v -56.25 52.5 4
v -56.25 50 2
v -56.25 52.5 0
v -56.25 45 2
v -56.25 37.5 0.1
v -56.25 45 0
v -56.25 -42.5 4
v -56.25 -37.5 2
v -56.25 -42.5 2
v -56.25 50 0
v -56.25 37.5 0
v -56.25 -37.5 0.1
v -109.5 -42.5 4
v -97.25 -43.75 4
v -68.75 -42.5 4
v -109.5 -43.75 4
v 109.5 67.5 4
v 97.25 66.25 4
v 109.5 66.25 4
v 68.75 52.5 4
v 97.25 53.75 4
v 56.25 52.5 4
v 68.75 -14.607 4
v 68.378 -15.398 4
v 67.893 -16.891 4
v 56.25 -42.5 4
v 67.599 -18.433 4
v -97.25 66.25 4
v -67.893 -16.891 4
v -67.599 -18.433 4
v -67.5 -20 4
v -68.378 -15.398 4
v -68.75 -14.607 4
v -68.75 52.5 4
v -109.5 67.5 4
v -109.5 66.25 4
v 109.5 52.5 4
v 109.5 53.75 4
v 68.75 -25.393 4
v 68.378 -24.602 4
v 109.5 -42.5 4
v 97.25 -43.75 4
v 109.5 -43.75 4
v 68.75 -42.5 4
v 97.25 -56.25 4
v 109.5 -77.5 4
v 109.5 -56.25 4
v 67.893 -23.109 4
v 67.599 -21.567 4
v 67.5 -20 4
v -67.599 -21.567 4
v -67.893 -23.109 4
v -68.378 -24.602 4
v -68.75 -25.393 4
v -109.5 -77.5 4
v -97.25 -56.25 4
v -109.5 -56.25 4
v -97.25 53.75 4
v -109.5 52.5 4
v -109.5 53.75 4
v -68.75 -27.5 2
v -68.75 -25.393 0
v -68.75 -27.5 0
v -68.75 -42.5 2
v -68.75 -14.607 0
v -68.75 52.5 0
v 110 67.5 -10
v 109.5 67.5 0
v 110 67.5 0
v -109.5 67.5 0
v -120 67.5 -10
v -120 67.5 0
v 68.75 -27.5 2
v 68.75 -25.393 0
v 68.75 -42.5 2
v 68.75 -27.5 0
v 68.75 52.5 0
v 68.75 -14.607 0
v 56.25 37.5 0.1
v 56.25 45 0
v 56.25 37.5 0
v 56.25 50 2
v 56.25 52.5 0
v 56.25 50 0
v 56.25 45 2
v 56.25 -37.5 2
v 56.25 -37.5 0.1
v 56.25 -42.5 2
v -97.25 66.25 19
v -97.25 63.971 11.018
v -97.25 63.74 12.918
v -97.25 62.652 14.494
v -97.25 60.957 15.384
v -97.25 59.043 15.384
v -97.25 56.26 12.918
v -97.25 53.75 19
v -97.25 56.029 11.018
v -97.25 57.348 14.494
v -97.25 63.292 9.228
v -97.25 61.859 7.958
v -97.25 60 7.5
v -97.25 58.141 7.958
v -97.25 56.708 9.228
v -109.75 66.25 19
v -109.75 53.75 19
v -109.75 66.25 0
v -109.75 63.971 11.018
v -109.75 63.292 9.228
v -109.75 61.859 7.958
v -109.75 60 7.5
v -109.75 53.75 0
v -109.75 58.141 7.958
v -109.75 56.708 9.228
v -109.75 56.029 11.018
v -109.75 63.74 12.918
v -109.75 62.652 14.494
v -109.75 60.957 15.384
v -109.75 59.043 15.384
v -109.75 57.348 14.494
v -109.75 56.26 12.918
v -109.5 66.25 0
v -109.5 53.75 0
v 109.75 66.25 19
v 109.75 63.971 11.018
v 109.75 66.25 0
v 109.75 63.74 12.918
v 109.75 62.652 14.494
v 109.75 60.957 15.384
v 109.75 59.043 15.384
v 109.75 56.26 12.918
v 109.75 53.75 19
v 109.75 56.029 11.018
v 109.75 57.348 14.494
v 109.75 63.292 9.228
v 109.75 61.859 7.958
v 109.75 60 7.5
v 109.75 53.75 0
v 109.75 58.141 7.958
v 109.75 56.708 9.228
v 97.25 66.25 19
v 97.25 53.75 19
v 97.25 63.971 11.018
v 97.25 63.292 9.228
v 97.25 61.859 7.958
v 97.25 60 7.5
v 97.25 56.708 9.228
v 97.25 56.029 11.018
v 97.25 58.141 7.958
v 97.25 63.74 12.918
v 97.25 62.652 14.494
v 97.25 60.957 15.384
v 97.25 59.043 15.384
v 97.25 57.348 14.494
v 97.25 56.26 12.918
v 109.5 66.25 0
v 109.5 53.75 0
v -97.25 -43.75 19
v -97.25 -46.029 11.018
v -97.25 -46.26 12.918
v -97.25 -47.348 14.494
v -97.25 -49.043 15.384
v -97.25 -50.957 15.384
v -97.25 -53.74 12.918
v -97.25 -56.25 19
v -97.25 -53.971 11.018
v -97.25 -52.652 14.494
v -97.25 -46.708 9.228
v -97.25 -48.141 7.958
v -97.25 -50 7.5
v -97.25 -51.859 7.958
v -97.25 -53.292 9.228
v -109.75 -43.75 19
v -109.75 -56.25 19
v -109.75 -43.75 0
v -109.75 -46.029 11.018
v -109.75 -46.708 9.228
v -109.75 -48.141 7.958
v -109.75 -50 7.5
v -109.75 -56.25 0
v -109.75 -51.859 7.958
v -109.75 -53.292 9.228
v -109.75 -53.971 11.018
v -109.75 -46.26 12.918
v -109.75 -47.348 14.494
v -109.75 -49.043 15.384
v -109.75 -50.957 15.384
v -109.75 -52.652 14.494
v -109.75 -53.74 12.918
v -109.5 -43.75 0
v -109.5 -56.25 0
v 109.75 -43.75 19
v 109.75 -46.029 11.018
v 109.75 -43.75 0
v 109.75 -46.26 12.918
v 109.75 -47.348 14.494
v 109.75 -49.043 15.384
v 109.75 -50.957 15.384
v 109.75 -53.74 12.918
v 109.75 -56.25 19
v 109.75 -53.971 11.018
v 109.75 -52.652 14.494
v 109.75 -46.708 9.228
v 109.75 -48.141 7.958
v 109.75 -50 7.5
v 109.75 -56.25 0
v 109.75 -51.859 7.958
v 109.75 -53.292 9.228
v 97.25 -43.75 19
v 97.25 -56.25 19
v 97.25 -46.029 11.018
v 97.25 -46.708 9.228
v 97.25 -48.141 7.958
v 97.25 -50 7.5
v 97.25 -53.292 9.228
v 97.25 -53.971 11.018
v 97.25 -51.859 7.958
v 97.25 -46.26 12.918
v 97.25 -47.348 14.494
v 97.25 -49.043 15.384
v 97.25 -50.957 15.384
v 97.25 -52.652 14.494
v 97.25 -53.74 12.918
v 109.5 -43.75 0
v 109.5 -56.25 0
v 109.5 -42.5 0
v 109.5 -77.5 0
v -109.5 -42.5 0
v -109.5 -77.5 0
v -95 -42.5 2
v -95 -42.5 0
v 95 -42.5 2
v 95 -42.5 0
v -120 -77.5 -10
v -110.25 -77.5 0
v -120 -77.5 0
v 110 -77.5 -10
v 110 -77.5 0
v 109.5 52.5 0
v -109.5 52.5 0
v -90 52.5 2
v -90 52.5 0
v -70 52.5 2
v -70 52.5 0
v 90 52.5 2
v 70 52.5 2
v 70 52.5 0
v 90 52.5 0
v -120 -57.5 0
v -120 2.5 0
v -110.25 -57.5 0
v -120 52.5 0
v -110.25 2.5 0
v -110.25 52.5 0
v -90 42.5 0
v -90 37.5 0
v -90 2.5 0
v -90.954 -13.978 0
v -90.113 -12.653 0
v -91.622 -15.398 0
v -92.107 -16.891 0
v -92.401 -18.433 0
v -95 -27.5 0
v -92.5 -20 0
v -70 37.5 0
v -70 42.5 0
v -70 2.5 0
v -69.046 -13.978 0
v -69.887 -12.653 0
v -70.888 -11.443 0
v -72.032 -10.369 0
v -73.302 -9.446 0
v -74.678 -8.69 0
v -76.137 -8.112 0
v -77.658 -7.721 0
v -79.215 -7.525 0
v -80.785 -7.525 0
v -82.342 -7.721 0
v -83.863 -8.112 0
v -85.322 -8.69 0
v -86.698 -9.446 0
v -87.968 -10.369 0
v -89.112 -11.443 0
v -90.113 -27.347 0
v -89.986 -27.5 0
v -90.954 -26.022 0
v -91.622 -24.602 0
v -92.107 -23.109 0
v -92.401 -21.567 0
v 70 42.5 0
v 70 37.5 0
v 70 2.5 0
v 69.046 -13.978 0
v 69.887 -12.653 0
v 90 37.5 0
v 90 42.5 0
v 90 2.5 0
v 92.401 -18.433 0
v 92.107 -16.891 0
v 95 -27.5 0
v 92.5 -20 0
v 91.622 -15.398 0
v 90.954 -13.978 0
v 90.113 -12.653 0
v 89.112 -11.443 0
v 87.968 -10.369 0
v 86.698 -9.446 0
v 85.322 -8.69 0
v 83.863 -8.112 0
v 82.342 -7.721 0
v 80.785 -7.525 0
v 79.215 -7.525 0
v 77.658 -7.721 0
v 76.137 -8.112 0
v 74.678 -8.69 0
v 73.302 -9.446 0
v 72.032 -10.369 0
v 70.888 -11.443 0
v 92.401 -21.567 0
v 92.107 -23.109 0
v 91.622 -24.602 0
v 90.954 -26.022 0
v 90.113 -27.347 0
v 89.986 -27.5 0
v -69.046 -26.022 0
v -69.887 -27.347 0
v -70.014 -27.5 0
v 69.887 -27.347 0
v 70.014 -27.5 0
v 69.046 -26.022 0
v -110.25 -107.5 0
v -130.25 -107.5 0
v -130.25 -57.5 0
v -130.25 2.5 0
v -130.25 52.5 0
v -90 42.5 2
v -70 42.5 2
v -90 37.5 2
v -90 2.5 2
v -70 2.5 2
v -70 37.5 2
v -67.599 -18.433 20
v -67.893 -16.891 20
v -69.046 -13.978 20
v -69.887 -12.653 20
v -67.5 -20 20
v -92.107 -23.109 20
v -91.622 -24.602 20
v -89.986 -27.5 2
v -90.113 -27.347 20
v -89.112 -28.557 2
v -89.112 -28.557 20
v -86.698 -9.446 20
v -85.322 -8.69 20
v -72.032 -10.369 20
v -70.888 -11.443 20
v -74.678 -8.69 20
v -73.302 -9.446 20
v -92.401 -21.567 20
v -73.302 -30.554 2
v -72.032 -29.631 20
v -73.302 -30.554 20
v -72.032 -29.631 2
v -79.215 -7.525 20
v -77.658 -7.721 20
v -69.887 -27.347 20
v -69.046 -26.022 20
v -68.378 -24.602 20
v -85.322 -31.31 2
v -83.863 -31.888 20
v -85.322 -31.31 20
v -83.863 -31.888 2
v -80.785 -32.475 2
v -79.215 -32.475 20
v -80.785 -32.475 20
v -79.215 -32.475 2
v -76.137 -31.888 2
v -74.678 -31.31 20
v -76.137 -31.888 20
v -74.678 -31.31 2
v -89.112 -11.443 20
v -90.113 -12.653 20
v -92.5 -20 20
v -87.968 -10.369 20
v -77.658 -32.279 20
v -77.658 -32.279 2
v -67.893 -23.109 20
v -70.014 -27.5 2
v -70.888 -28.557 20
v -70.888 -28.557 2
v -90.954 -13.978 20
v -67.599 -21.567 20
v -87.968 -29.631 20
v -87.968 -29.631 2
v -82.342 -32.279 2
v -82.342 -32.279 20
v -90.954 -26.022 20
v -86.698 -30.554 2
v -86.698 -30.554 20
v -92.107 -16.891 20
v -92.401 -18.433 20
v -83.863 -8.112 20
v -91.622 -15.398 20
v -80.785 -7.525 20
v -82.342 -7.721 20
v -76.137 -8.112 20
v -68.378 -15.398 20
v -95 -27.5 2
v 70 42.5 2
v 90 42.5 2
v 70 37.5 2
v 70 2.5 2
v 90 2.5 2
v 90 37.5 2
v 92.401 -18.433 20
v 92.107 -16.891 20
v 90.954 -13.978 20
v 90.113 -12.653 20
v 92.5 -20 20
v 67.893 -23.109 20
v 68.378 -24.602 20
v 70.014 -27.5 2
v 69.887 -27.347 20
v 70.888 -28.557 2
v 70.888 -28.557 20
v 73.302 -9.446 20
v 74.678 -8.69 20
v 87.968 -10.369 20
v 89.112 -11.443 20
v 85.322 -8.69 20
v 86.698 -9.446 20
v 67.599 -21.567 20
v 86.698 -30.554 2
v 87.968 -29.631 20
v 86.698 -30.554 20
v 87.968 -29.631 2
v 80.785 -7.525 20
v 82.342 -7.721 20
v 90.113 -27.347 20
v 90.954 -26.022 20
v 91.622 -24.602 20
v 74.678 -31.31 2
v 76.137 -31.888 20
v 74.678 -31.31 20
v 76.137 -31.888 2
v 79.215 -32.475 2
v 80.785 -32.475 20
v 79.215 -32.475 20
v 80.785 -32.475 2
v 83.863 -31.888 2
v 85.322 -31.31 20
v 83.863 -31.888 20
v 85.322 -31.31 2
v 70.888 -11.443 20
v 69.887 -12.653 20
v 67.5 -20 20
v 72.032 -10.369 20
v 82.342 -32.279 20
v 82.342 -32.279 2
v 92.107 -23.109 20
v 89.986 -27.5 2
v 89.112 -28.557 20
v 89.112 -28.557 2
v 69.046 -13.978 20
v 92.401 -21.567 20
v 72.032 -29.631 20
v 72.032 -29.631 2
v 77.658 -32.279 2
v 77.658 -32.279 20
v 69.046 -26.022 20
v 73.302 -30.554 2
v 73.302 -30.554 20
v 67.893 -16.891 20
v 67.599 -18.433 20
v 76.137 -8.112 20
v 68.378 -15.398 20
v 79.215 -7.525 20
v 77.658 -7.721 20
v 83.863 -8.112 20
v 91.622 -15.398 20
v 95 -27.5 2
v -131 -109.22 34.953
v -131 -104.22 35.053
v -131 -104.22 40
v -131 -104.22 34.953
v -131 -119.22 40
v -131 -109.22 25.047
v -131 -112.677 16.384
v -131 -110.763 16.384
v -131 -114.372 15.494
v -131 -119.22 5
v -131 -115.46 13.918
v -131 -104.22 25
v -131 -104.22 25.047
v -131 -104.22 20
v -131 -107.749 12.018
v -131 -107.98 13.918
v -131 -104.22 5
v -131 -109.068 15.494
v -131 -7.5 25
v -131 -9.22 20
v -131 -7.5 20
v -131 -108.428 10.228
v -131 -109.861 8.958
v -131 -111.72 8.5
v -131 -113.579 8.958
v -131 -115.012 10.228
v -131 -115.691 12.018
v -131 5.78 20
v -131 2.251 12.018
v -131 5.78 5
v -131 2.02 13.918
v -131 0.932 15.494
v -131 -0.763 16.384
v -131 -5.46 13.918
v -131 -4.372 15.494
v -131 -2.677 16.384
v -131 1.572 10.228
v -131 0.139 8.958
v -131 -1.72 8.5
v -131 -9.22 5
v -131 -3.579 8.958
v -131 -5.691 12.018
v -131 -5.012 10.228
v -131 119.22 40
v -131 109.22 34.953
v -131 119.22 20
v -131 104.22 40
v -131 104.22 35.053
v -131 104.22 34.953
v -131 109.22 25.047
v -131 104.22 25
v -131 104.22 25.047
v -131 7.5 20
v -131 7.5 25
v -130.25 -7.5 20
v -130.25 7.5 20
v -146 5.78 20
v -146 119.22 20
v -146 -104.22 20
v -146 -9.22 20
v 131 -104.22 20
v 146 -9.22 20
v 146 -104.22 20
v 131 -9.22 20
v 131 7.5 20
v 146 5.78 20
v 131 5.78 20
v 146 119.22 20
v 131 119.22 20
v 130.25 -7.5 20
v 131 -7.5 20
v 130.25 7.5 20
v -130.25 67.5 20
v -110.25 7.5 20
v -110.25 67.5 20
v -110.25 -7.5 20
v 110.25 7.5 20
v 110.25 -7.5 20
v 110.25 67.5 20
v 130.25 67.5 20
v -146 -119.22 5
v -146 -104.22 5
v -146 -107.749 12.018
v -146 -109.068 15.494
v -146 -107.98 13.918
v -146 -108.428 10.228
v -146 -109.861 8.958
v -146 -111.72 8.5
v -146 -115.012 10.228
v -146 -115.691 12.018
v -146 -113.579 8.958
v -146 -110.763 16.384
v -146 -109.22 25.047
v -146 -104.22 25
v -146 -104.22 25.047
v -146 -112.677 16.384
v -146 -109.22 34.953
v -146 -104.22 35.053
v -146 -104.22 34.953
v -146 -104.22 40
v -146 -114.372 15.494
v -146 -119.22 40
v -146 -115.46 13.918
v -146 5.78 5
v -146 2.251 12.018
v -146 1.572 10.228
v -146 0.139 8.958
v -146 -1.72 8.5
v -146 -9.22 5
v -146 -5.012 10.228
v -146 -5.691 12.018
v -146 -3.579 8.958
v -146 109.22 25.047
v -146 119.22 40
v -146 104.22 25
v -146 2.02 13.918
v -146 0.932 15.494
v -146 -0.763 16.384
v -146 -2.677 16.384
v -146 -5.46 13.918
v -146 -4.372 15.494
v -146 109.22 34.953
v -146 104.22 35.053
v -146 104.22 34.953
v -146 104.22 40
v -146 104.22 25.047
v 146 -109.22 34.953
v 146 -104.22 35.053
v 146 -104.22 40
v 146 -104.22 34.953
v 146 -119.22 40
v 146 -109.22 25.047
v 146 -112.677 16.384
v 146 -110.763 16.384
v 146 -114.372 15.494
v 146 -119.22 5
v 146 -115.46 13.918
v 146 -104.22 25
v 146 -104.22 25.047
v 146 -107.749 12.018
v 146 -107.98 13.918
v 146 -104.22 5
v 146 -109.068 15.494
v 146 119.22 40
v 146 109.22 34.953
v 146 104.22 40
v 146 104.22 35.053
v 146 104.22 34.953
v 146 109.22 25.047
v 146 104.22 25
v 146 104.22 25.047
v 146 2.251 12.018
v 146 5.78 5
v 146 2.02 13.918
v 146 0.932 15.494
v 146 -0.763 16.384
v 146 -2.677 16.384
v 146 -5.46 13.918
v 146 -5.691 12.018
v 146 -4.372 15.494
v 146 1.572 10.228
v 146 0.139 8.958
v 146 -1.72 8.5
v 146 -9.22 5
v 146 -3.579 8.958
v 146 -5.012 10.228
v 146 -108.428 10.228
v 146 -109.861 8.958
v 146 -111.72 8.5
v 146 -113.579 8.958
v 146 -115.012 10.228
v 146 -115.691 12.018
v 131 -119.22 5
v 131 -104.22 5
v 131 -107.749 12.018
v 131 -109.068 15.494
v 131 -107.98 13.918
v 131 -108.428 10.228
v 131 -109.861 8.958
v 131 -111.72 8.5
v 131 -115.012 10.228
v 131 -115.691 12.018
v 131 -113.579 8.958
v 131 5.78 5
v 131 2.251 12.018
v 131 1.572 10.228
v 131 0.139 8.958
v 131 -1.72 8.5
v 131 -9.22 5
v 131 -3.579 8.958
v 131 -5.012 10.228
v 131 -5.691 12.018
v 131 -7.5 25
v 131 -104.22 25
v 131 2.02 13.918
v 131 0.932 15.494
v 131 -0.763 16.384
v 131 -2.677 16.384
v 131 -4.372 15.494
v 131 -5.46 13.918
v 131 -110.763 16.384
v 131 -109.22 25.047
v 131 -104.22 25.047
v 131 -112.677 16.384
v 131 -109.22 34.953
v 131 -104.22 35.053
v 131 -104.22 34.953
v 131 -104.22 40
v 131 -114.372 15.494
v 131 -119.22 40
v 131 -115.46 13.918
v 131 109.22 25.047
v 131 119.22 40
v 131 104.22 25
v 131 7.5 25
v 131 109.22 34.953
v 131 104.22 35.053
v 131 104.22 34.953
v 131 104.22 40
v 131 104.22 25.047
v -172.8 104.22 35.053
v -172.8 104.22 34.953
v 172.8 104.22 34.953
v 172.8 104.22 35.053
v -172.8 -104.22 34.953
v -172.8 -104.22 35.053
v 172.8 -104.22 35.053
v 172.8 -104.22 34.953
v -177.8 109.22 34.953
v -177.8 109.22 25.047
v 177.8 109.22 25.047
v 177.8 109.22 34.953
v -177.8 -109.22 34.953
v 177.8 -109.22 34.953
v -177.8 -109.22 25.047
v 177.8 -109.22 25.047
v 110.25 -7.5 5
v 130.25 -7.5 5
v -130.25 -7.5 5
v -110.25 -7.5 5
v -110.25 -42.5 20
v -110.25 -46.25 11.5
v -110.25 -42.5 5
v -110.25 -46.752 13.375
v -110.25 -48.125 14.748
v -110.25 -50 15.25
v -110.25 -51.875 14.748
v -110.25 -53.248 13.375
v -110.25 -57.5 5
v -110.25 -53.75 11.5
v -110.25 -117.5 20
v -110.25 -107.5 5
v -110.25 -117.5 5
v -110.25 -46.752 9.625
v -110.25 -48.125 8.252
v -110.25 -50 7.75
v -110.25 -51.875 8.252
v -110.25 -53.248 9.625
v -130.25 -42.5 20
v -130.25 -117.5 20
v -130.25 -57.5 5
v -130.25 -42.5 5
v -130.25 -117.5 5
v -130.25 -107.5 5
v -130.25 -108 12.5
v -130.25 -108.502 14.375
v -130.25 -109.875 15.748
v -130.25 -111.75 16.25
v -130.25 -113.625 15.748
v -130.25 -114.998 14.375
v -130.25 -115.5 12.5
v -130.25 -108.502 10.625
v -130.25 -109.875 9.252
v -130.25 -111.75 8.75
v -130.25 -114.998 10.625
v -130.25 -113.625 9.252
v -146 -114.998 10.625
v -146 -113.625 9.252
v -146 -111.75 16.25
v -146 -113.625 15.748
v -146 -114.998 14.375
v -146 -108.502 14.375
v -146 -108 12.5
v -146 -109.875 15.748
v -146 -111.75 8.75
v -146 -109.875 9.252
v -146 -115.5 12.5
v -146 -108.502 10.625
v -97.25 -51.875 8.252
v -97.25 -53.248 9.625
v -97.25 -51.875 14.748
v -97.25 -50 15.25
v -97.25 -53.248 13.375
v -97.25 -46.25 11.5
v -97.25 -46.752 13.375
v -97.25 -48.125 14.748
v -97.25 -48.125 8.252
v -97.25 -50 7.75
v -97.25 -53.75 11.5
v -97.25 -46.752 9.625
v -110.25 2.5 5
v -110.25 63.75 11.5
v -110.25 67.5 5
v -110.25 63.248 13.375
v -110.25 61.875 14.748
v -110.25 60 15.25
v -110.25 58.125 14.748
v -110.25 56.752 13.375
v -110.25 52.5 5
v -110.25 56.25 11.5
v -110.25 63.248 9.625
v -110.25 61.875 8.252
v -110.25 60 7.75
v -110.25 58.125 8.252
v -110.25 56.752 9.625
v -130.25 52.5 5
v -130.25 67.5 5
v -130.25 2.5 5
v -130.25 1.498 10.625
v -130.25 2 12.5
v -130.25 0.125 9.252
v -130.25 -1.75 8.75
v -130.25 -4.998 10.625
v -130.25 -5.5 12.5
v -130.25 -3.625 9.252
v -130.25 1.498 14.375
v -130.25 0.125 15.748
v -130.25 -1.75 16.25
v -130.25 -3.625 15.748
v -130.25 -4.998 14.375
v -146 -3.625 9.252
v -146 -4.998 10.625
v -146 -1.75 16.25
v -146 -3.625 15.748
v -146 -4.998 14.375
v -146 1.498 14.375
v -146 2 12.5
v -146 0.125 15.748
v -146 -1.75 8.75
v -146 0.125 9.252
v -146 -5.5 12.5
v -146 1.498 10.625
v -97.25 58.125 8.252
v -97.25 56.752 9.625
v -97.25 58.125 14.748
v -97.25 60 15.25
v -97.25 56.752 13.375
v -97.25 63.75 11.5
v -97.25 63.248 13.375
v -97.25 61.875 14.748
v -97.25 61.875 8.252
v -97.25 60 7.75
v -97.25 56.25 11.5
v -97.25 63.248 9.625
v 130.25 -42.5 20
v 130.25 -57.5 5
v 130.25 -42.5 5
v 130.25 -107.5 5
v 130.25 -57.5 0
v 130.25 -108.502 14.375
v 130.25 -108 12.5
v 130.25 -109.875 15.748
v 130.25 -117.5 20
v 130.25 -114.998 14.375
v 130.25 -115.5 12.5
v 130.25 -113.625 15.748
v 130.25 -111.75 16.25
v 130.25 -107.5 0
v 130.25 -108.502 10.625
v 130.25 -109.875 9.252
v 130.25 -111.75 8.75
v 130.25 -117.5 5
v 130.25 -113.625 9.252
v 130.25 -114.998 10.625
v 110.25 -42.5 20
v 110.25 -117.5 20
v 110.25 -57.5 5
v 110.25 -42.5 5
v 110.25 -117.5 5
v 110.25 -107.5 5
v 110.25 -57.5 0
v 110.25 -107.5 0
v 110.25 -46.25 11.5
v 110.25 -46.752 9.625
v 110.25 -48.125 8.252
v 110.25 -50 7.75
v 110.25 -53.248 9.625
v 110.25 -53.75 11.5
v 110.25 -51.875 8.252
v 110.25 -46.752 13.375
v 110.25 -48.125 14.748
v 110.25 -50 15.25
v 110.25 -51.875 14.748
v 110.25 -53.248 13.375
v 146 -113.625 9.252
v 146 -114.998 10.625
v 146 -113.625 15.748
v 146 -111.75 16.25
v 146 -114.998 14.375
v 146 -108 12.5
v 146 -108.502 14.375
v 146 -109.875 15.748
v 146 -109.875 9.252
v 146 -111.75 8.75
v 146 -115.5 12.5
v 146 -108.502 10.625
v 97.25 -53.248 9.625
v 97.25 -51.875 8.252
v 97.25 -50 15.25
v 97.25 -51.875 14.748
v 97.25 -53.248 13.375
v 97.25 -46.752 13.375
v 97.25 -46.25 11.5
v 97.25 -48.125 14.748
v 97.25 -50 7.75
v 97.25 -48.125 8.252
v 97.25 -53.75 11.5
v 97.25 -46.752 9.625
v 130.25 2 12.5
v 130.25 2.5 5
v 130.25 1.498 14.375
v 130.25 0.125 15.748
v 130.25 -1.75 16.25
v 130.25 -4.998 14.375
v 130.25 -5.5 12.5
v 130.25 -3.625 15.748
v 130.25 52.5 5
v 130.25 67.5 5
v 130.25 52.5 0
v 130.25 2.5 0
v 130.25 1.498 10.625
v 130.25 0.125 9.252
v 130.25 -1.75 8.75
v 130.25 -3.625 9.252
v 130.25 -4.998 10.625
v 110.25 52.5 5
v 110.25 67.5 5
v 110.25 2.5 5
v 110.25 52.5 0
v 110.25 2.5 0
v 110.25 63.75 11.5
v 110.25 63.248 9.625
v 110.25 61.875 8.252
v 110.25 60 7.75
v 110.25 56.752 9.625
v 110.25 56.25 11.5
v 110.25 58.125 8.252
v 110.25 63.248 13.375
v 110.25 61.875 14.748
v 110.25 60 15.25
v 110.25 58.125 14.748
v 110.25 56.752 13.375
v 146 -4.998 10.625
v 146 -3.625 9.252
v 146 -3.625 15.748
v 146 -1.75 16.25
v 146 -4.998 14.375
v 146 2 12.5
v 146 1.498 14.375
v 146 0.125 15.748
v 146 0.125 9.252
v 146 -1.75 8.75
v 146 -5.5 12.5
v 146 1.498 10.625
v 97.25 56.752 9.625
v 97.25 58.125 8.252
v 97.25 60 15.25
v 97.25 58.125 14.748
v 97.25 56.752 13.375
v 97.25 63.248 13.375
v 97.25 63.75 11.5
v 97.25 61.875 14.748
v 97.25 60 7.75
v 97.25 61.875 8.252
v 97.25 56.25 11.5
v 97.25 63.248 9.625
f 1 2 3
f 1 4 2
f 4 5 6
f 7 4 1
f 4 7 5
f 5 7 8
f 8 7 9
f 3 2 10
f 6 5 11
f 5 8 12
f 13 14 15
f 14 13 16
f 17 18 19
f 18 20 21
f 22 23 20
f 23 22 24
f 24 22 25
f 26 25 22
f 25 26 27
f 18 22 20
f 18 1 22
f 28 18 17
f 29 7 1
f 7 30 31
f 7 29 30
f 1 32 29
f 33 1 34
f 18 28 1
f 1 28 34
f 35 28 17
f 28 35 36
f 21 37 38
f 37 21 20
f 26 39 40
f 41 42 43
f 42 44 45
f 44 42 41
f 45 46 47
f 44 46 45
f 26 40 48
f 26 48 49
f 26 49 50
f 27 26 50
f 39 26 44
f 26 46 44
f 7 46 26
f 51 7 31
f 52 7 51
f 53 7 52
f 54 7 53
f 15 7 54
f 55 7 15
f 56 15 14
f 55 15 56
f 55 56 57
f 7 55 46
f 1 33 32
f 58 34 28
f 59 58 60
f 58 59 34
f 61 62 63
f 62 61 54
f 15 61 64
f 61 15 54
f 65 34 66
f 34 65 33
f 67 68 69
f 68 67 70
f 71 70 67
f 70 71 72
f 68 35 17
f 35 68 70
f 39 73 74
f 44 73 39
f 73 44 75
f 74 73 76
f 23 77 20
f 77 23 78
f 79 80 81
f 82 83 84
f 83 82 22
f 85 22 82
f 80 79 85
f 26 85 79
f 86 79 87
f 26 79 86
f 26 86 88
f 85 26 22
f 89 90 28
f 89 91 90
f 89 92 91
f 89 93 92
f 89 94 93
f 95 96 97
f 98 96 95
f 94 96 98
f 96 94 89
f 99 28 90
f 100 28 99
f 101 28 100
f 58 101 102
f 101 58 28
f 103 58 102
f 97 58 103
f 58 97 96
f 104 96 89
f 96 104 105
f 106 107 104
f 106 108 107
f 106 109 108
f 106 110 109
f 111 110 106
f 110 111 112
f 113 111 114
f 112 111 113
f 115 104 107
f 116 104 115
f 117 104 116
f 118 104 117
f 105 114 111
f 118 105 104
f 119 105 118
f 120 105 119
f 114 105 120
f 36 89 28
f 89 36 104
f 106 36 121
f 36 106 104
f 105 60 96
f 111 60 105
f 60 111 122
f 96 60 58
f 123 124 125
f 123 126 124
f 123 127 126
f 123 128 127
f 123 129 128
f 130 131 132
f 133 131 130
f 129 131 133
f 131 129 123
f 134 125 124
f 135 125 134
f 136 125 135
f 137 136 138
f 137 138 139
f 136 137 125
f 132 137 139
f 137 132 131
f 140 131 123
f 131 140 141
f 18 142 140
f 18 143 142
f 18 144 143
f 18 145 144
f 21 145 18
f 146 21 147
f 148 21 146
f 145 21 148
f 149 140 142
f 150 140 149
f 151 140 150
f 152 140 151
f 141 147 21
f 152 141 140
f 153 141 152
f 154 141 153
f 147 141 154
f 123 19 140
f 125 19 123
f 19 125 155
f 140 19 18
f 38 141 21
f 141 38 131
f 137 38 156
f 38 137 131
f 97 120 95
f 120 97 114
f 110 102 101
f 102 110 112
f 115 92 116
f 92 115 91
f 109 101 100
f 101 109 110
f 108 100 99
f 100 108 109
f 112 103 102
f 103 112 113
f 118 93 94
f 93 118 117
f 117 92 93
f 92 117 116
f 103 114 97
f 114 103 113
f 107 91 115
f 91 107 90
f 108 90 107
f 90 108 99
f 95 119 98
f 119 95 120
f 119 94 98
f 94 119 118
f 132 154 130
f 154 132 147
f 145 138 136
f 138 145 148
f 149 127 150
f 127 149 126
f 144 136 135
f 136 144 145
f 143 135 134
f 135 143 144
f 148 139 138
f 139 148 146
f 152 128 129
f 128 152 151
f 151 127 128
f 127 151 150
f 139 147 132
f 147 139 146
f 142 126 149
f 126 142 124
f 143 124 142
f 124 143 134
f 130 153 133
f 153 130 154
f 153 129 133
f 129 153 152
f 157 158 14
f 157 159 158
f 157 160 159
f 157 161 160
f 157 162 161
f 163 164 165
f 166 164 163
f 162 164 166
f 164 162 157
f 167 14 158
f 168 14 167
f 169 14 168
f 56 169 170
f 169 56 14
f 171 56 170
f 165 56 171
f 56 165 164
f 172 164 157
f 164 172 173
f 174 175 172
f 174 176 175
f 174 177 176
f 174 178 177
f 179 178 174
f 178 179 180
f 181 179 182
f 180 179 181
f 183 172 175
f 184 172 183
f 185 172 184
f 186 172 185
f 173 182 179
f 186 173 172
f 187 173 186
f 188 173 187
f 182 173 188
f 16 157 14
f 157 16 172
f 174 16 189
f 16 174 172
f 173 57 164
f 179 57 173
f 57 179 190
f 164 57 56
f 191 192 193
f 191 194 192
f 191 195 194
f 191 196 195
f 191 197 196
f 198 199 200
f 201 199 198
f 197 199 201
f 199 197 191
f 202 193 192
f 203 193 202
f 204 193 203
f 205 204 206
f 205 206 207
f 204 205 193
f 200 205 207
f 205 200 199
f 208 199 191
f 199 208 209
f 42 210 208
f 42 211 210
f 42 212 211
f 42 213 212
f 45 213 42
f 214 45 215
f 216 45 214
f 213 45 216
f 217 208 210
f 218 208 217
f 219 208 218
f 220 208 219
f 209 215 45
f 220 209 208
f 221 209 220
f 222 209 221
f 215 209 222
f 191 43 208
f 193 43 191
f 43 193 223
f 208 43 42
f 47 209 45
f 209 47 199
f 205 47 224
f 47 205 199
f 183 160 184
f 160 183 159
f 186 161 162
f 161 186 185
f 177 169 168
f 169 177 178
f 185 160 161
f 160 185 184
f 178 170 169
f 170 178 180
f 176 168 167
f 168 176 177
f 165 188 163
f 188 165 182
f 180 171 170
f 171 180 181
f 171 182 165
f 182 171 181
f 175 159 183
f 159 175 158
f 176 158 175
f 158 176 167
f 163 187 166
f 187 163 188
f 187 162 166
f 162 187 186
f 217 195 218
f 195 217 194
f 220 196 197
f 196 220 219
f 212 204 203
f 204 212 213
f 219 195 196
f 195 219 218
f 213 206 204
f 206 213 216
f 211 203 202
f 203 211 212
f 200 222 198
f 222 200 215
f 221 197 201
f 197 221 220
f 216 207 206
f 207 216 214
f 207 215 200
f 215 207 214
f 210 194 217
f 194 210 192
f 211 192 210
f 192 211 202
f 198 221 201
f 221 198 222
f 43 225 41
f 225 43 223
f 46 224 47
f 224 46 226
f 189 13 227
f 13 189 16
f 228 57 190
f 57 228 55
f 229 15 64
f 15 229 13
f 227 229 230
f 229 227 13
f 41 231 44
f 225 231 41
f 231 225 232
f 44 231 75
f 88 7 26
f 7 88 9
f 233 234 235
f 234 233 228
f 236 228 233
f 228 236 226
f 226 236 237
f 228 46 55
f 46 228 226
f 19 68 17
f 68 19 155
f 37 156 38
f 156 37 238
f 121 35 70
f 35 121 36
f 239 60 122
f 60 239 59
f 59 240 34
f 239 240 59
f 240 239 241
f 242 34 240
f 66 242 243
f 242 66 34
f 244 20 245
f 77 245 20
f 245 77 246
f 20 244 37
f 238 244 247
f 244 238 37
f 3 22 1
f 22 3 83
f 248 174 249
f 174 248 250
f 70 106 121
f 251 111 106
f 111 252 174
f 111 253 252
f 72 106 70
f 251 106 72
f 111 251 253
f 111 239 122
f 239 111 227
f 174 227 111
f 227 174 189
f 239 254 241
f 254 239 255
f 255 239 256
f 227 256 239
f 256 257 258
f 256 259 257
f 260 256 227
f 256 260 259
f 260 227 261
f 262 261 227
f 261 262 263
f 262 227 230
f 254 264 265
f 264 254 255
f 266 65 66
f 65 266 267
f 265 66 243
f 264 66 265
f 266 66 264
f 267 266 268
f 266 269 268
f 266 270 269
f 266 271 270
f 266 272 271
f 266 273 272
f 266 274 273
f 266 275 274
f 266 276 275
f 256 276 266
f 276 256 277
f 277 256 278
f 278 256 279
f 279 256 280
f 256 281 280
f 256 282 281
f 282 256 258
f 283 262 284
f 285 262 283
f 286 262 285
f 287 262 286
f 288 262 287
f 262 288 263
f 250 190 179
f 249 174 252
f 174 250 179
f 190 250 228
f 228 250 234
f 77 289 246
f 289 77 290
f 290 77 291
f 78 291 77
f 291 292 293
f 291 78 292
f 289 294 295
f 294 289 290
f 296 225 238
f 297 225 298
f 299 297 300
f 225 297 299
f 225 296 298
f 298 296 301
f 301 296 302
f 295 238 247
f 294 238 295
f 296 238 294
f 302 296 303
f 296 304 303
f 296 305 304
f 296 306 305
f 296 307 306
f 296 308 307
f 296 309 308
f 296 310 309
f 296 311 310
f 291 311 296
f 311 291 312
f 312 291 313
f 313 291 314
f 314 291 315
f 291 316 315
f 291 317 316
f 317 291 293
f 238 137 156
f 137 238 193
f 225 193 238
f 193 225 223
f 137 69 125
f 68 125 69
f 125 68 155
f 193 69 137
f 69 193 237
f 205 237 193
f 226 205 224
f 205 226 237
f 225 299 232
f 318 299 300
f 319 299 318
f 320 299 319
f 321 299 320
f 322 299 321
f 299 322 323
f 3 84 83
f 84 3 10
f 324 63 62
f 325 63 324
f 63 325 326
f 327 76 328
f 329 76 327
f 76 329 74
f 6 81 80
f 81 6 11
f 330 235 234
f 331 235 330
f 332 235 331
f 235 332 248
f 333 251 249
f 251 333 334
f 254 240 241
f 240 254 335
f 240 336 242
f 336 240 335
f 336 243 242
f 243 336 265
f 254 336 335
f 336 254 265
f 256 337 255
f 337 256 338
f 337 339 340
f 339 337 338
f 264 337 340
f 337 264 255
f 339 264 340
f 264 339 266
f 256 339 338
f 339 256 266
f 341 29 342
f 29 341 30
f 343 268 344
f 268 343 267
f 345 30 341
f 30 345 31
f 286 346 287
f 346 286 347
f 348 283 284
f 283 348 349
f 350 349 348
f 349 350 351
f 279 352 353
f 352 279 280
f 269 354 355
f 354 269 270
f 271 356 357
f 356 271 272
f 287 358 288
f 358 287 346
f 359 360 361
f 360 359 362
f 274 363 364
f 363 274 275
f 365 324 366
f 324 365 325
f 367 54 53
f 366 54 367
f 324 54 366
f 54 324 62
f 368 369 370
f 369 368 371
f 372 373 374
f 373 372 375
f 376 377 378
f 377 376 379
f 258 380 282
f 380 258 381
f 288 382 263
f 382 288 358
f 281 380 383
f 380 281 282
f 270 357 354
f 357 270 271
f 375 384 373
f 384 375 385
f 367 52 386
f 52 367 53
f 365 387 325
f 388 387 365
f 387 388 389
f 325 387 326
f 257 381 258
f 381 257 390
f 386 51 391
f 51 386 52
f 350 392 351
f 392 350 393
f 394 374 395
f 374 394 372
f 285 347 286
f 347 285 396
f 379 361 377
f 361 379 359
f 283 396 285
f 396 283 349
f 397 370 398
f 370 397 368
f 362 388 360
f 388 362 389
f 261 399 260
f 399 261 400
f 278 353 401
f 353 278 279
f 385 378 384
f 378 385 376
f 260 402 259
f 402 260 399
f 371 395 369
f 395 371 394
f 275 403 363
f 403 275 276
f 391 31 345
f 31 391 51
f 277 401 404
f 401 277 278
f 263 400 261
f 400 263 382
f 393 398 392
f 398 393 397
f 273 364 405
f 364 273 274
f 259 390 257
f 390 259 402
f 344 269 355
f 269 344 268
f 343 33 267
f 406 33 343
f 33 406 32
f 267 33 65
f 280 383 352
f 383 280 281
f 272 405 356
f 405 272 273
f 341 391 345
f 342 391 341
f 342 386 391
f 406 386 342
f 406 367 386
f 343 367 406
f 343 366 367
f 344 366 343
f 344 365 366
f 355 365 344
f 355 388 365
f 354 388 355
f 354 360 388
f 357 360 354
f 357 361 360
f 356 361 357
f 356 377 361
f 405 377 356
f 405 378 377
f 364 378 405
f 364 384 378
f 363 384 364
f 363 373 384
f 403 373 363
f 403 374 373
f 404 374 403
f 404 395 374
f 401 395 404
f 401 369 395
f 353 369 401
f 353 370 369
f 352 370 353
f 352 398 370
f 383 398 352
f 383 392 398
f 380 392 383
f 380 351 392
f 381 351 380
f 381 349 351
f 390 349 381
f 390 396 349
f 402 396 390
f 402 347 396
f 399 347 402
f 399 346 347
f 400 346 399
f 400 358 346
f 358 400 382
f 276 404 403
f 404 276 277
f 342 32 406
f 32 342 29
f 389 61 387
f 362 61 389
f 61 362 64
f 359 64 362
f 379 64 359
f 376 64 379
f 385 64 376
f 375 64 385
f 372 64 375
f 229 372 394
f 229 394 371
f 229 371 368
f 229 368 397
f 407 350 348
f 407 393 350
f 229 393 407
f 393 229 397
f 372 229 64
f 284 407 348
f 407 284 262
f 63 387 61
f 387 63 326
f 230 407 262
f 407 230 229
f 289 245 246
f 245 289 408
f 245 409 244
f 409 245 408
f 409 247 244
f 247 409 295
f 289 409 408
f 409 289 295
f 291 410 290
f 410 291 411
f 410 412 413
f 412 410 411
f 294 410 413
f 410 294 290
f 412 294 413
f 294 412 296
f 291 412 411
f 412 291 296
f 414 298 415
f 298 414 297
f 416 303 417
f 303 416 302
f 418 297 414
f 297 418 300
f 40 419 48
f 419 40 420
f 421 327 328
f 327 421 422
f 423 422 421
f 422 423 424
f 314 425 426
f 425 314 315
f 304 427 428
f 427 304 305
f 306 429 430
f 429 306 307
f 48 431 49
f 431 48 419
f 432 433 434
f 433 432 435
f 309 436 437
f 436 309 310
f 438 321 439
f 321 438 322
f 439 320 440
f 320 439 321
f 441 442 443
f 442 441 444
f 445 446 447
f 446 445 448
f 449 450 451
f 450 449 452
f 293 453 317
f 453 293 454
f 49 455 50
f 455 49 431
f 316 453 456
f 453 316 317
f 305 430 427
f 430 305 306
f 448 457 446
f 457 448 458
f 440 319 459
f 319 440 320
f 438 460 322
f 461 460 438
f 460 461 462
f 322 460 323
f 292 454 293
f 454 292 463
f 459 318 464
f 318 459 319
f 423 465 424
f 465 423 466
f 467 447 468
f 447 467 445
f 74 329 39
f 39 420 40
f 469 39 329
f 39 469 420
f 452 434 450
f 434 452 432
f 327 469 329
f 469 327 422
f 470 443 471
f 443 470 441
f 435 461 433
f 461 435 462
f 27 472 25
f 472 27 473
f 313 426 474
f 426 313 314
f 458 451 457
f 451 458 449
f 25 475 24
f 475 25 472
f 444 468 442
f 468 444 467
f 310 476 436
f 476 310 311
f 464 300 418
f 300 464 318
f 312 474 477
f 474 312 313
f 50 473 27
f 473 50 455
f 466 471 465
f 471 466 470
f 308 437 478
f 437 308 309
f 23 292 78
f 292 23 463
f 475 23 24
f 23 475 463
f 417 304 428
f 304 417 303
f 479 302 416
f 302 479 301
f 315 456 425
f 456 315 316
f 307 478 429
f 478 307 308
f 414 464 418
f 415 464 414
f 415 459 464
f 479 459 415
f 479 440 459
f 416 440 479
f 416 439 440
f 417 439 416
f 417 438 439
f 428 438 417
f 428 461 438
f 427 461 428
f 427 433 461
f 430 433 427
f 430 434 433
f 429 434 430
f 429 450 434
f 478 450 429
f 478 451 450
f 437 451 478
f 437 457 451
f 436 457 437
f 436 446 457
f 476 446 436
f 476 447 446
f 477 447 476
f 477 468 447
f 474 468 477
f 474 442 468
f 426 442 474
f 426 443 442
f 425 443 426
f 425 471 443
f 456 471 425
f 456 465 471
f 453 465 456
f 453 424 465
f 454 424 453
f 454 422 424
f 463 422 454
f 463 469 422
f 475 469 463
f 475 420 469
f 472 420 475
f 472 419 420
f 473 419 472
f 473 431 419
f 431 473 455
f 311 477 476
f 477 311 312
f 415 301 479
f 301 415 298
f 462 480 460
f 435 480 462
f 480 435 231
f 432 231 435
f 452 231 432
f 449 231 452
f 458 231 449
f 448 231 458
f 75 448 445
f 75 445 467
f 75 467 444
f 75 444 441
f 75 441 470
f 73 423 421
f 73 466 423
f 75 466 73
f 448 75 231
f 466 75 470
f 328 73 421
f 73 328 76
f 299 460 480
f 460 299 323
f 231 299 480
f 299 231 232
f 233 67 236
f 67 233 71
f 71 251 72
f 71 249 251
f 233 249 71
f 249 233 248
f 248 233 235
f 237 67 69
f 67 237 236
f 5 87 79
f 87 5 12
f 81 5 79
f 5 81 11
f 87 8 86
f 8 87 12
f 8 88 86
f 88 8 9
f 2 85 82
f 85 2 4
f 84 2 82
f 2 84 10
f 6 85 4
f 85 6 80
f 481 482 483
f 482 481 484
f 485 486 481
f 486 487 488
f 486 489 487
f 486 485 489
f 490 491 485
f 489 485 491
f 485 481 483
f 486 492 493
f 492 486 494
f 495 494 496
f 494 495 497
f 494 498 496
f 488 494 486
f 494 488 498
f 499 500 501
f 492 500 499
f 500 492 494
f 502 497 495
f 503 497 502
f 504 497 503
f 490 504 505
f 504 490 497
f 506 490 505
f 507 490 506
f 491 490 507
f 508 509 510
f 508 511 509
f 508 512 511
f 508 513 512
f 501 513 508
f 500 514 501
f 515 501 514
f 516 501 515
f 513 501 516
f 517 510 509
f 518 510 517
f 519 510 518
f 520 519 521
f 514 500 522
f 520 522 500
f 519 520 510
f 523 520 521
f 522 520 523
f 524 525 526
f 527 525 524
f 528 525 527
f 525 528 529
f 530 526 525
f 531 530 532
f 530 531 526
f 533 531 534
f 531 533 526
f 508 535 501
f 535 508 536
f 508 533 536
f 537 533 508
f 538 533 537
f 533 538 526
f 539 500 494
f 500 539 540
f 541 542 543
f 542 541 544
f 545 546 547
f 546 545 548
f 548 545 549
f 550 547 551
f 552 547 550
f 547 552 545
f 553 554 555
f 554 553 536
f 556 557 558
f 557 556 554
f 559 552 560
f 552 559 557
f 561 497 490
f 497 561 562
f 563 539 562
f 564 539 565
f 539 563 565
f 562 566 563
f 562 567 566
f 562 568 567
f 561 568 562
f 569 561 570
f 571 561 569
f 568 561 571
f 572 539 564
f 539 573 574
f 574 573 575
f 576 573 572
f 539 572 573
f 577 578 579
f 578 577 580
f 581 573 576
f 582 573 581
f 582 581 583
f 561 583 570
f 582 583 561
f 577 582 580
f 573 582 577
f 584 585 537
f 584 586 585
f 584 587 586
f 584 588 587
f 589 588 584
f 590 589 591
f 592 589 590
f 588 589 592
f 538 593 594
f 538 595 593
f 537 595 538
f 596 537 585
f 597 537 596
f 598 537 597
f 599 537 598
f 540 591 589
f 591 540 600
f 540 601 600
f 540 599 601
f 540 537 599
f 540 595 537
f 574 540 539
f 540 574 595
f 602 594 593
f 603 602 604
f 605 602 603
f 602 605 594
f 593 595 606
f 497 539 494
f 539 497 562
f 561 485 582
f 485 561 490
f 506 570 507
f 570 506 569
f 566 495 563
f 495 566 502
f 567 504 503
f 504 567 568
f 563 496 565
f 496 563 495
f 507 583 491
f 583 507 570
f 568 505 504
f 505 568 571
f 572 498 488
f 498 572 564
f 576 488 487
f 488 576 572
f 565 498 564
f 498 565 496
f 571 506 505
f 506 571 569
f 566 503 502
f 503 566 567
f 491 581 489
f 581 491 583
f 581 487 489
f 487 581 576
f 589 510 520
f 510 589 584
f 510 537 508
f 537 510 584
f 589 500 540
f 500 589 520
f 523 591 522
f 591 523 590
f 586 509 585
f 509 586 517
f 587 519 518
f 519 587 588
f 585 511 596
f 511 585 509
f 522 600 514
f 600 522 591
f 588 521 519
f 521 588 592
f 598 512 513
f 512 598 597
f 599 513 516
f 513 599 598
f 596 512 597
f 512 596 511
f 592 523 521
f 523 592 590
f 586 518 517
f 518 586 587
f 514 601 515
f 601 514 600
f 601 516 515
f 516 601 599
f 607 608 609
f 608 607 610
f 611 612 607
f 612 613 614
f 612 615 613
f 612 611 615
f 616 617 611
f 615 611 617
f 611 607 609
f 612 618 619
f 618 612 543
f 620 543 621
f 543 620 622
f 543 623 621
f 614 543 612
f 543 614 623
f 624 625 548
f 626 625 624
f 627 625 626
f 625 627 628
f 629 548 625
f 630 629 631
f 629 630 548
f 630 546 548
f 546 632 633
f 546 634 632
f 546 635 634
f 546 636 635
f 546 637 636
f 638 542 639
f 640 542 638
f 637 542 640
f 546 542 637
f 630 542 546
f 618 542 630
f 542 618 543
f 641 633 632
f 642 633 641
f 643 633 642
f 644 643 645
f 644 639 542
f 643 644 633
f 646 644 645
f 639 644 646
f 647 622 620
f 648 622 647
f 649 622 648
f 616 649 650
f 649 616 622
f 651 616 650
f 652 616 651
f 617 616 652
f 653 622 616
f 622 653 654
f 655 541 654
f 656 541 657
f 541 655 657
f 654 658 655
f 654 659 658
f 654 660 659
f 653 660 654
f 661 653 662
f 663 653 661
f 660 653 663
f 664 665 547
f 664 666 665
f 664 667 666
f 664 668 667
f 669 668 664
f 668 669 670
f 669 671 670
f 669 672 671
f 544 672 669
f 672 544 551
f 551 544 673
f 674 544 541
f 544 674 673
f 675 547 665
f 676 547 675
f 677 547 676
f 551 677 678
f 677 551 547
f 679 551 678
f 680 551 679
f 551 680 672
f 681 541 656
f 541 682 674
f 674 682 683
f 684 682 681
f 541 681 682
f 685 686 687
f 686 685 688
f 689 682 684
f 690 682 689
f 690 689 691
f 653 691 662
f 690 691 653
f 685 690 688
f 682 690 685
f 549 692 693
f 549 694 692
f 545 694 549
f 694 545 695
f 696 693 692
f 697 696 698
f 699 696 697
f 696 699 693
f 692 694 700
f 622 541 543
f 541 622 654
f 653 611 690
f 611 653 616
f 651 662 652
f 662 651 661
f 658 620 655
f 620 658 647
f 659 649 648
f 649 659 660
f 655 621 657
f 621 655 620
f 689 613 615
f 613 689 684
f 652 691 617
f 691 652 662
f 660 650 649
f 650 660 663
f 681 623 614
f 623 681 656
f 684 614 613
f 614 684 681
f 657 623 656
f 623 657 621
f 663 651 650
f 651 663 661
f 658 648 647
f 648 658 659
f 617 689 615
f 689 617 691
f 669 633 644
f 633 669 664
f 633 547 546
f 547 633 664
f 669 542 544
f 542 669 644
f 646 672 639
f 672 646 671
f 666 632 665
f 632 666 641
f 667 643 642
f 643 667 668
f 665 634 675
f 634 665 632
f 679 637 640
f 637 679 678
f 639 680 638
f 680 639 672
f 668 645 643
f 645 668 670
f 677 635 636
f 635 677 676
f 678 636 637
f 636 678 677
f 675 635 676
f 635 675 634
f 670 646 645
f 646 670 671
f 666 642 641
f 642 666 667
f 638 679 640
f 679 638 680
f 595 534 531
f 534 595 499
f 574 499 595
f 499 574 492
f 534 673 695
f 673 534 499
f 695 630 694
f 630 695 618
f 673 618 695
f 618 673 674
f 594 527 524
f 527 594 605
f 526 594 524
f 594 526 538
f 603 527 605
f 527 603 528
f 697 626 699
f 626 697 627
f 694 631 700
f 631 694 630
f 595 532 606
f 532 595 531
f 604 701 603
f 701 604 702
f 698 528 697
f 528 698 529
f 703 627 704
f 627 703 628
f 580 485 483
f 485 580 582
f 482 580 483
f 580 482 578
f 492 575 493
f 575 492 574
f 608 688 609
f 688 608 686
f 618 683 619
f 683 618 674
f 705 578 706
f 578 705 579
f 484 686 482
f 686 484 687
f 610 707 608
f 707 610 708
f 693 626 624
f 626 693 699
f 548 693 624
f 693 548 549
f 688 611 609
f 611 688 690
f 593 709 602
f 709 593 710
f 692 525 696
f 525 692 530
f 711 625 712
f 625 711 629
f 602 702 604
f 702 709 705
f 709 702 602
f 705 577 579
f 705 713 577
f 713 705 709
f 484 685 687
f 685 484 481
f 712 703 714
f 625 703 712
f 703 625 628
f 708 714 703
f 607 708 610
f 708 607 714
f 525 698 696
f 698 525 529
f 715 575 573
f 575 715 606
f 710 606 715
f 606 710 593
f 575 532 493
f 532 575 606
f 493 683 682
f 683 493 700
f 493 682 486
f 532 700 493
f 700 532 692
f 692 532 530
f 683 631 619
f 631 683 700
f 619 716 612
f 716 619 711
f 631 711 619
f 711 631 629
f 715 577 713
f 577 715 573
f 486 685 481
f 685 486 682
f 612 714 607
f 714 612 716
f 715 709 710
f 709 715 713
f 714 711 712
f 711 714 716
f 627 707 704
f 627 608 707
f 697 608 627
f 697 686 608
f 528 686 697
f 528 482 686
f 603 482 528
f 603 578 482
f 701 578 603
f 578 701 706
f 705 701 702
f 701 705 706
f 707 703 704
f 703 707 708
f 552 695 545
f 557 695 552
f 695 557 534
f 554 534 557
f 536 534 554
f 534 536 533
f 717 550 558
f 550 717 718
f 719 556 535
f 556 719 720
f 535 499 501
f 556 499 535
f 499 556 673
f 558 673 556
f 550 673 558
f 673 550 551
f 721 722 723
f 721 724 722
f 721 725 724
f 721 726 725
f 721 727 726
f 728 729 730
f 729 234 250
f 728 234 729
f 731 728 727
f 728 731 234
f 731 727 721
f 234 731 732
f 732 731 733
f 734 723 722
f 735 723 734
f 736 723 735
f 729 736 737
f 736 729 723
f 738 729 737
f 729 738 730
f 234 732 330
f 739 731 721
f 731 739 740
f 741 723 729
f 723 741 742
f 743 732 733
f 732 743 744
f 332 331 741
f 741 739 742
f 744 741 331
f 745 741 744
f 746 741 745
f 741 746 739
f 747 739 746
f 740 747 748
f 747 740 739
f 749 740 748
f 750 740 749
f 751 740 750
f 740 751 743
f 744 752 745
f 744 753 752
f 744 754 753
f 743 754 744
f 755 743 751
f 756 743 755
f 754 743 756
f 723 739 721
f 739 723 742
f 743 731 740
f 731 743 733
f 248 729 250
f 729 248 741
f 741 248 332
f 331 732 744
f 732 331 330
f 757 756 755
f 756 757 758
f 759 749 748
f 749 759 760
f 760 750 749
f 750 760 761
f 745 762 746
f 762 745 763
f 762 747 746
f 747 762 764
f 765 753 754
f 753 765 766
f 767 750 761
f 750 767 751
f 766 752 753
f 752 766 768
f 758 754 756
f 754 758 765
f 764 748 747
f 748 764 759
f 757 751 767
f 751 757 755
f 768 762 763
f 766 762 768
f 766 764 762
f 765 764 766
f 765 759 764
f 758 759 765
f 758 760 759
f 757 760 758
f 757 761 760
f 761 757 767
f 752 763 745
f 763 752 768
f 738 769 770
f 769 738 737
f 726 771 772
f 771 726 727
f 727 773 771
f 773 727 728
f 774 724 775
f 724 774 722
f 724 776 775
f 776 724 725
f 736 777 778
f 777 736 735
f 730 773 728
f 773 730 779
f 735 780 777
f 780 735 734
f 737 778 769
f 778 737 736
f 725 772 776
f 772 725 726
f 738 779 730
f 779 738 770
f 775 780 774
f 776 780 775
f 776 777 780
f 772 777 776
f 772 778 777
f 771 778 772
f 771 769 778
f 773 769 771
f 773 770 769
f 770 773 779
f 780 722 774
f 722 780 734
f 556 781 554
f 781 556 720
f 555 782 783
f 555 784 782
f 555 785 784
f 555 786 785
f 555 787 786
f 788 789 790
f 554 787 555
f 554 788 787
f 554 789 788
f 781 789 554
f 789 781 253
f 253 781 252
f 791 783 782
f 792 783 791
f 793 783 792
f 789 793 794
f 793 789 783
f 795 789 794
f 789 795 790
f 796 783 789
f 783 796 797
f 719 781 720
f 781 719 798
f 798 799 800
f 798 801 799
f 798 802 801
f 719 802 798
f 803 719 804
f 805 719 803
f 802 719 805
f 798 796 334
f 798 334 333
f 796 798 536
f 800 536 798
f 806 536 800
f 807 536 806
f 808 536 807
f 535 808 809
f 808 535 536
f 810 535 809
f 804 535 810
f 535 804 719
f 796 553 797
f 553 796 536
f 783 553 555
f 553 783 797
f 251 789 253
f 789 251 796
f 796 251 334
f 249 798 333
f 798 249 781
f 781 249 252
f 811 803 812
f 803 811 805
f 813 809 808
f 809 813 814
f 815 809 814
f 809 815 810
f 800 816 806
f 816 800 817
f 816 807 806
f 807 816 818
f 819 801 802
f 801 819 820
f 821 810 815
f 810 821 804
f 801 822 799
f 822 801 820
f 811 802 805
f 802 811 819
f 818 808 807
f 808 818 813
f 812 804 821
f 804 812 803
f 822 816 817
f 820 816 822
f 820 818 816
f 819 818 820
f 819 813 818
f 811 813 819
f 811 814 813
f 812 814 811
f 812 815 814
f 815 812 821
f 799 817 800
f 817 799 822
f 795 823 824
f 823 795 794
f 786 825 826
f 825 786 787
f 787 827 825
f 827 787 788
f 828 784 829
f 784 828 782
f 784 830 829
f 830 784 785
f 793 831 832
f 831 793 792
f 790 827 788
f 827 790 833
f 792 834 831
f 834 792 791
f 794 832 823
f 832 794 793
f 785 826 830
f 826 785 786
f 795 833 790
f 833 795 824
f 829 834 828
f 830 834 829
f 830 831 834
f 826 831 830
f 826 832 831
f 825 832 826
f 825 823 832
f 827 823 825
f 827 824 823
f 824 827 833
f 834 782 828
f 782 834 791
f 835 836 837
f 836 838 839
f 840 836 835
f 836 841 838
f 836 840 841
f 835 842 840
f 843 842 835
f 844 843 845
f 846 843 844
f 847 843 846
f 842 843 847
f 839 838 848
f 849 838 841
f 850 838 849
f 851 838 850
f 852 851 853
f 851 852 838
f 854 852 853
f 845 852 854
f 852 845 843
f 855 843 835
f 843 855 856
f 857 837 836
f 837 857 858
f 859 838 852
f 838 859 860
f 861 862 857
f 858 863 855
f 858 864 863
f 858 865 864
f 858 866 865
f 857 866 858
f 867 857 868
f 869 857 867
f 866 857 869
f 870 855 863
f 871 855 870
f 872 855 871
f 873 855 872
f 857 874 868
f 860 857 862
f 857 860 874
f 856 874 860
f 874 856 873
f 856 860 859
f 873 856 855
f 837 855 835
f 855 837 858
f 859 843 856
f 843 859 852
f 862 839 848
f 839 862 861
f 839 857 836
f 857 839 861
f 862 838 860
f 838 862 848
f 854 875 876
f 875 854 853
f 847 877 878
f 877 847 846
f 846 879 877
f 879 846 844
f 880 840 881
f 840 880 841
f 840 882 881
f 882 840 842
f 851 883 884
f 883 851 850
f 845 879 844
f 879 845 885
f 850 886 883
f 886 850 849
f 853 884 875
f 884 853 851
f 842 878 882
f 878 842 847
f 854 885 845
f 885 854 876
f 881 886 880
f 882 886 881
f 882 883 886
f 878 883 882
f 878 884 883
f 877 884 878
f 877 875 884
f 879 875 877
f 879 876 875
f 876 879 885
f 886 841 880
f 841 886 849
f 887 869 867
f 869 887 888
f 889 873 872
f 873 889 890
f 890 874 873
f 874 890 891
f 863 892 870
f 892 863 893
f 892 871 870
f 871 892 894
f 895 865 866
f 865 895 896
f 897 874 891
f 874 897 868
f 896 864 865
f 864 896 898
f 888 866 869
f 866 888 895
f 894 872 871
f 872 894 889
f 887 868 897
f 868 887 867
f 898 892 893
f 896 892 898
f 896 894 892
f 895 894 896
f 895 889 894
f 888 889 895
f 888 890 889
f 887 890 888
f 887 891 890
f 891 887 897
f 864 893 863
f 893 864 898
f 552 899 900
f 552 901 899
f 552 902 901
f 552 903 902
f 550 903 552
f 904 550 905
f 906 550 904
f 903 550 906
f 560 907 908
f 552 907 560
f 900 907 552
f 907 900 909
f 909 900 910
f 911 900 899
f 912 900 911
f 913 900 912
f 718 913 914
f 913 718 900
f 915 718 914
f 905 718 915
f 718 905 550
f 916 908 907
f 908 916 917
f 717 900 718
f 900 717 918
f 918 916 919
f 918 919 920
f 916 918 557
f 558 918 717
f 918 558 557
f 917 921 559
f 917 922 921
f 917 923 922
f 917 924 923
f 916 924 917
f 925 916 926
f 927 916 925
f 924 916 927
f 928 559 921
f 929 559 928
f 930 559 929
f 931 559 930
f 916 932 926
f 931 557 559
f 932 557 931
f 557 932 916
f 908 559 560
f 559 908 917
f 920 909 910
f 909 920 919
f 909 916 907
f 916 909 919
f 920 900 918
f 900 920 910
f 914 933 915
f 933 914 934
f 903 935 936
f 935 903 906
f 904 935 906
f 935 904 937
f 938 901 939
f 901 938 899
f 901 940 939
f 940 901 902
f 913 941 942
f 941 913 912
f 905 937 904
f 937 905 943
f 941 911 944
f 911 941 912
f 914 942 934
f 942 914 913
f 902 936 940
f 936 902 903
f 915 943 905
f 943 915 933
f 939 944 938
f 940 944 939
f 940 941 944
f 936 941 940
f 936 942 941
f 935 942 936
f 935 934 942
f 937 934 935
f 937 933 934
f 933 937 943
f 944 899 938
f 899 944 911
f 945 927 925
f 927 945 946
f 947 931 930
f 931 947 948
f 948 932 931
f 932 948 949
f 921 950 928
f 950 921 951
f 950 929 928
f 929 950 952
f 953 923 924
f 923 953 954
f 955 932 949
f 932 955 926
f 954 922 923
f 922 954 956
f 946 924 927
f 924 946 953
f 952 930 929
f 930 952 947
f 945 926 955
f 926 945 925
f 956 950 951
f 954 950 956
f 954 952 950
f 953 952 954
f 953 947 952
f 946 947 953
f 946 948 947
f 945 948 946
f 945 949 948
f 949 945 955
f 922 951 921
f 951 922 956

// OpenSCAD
// file: mount2.scad
use <dash.scad>
use <monitor.scad>

hinge_radius = 4;

module mount2_base() {
    module _mount() {
        hinge_depth = 20;
        //hinge_radius = 4;
        module arm() {
            for(i=[-1,1]) translate([i*62.5,07.5,plate_depth/2])cube([12.5, 120, plate_depth], center=true);
        }
        arm();
        module hinge_base_top() {
            for(i=[-1,1]) translate([i*103.5,60,hinge_depth/2])cube([12.5, 12.5, hinge_depth], center=true);
        }
        module hinge_inner_top() {
            for(i=[-1,1]) translate([i*103.5,60,hinge_depth/2 + plate_depth/2])rotate([0,90,0])cylinder(hinge_depth+0.1, r=hinge_radius, center=true);
        }
        difference(){
            hinge_base_top();
            hinge_inner_top();
        }
        module hinge_base_bottom() {
            for(i=[-1,1]) translate([i*103.5,-50,hinge_depth/2])cube([12.5, 12.5, hinge_depth], center=true);
        }
        module hinge_inner_bottom() {
            for(i=[-1,1]) translate([i*103.5,-50,hinge_depth/2 + plate_depth/2])rotate([0,90,0])cylinder(hinge_depth+0.1, r=hinge_radius, center=true);
        }
        difference(){
            hinge_base_bottom();
            hinge_inner_bottom();
        }
        
        plate_depth = 05;
        translate([0,-60,plate_depth/2])cube([219, 35, plate_depth], center=true);
        translate([0,60,plate_depth/2])cube([219, 15, plate_depth], center=true);
    }
    difference() {
        translate([0,0,-01])_mount();
        translate([-05,-05,0])dash();
    }
}
mount2_base();

module mount2_top() {
    plate_depth = 05;
    module _mount() {
        translate([-103.5-15-20, 0,plate_depth/2+20])cube([15, 218.44, plate_depth], center=true);
        translate([-103.5-15-27.5, 218.44/2-5, 20])cube([15, 15, 20]);
        translate([-103.5-15-27.5, -1*(218.44/2-5)-15, 20])cube([15, 15, 20]);
        translate([103.5+15+20, 0,plate_depth/2+20])cube([15, 218.44, plate_depth], center=true);
        translate([-1*(-103.5-27.5), 218.44/2-5, 20])cube([15, 15, 20]);
        translate([-1*(-103.5-27.5), -1*(218.44/2-5)-15, 20])cube([15, 15, 20]);
        
        module left_hinge_base() {
            difference() {
                translate([-103.5-15-27.5, -1*(218.44/2-5)-15, 5])cube([15, 15, 15]);
                translate([-103.5-15-27.5+(15/2), -1*(218.44/2-5)-(15/2), 12.5])rotate([0,90,0])cylinder(15+0.1, r=hinge_radius, center=true);
            }
        }
        left_hinge_base();
        translate([0, 110, 0])left_hinge_base();
        module right_hinge_base() {
            difference() {
                translate([-1*(-103.5-27.5), -1*(218.44/2-5)-15, 5])cube([15, 15, 15]);
                translate([-1*(-103.5-27.5-(15/2)), -1*(218.44/2-5)-(15/2), 12.5])rotate([0,90,0])cylinder(15+0.1, r=hinge_radius, center=true);
            }
        }
        right_hinge_base();
        translate([0, 110, 0])right_hinge_base();
    }
    translate([0, 0,plate_depth/2+20])cube([2*(103.5+15+20), 15, plate_depth], center=true);
    difference() {
        _mount();
        rotate([0, 0, 90])translate([0,0,30])monitor();
    }
}
mount2_top();

module arm_lower_left() {
    translate([-130.25, -117.5, 5])cube([20, 75, 15]);
    translate([-130.25, -107.5, 0])cube([20, 50, 15]);
    translate([-146, -111.75, 12.5])rotate([0,90,0])cylinder(h=20, r = hinge_radius-0.25,        centered=true);
    translate([-117.25, -50, 11.5])rotate([0,90,0])cylinder(h=20, r = hinge_radius-0.25,        centered=true);
}
arm_lower_left();


module arm_upper_left() {
    translate([0, 110, 0])arm_lower_left();
}
arm_upper_left();



module arm_lower_right() {
    translate([110.25, -117.5, 5])cube([20, 75, 15]);
    translate([110.25, -107.5, 0])cube([20, 50, 15]);
    translate([126, -111.75, 12.5])rotate([0,90,0])cylinder(h=20, r = hinge_radius-0.25,        centered=true);
    translate([117.25-20, -50, 11.5])rotate([0,90,0])cylinder(h=20, r = hinge_radius-0.25,        centered=true);
}
arm_lower_right();


module arm_upper_right() {
    translate([0, 110, 0])arm_lower_right();
}
arm_upper_right();
// file: monitor.scad
module monitor(){
    module monitor_cm(){
        total_dims = [21.844, 35.56, 0.9906];
        screen_dims = [total_dims[0]-1, total_dims[1]-1];
        color("LightBlue", 1.0)cube(total_dims, center=true);
        color("blue", 1.0)translate([0,0, total_dims[2]/2])linear_extrude(height=0.01)square(screen_dims, center=true);   
    }
    scale([10,10,10])monitor_cm();
}
monitor();
// file: dash.scad
module dash(){
    module dash_cm(){
        total_area_dims = [23, 14.5];
        
        // total dash
        color("LightBlue")translate([0,0,-1])linear_extrude(height=1)square(total_area_dims, center=true);
        
        // screen
        screen_dims = [12, 7.5];
        screen_center = [0.5, 0.5, 0];
        color("Blue")translate(screen_center)linear_extrude(height=.01)square(screen_dims, center=true);
        
        // buttons
        button_height = 0.2;
        
        radio_button_dims = [screen_dims[0], 0.5];
        radio_button_center = screen_center + [0, -((screen_dims[1]/2)+radio_button_dims[1]/2)];
        color("DodgerBlue")translate(radio_button_center)linear_extrude(height=button_height)square(radio_button_dims, center=true);
        
        // cd player
        cd_player_dims = [13, 0.5];
        cd_player_center = screen_center + [0, screen_dims[1]/2 + 1];
        color("DodgerBlue")translate(cd_player_center)linear_extrude(height=button_height)square(cd_player_dims, center=true);
        
        module side_buttons() {
            color("DeepSkyBlue")translate([0,1,0])linear_extrude(height=button_height)square([2,1], center=true);
            color("DeepSkyBlue")translate([0,-1.75/2,0])linear_extrude(height=button_height)square([2,1.75], center=true);
            color("blue")translate([0,-1.75 * 3/2,0])linear_extrude(height=button_height)square([2,1.75], center=true);
            
            color("CornflowerBlue")translate([0,-5.75,0])linear_extrude(height=2)circle(1.25, $fn=50);
            color("DeepSkyBlue")translate([1.5/2,-5.75 - 2.5 + (1.75/2),0])linear_extrude(height=button_height)square([1.5,1.75], center=true);
            color("blue")translate([-1.5/2,-5.75 - 2.5 + (1.75/2),0])linear_extrude(height=button_height)square([1.5,1.75], center=true);
        }
        for(i=[-1,1]) translate(screen_center + [i*(screen_dims[0]/2+2), screen_dims[1]/2, 0])side_buttons();
    }
    scale([10,10,10])dash_cm();
}
dash();
// main file
use <dash.scad>
use <monitor.scad>
use <mount2.scad>

mount2_base();
mount2_top();
arm_lower_left();
arm_upper_left();
arm_lower_right();
arm_upper_right();
translate([-05,-05,0])dash();
rotate([0, 0, 90])translate([0,0,30])monitor();
